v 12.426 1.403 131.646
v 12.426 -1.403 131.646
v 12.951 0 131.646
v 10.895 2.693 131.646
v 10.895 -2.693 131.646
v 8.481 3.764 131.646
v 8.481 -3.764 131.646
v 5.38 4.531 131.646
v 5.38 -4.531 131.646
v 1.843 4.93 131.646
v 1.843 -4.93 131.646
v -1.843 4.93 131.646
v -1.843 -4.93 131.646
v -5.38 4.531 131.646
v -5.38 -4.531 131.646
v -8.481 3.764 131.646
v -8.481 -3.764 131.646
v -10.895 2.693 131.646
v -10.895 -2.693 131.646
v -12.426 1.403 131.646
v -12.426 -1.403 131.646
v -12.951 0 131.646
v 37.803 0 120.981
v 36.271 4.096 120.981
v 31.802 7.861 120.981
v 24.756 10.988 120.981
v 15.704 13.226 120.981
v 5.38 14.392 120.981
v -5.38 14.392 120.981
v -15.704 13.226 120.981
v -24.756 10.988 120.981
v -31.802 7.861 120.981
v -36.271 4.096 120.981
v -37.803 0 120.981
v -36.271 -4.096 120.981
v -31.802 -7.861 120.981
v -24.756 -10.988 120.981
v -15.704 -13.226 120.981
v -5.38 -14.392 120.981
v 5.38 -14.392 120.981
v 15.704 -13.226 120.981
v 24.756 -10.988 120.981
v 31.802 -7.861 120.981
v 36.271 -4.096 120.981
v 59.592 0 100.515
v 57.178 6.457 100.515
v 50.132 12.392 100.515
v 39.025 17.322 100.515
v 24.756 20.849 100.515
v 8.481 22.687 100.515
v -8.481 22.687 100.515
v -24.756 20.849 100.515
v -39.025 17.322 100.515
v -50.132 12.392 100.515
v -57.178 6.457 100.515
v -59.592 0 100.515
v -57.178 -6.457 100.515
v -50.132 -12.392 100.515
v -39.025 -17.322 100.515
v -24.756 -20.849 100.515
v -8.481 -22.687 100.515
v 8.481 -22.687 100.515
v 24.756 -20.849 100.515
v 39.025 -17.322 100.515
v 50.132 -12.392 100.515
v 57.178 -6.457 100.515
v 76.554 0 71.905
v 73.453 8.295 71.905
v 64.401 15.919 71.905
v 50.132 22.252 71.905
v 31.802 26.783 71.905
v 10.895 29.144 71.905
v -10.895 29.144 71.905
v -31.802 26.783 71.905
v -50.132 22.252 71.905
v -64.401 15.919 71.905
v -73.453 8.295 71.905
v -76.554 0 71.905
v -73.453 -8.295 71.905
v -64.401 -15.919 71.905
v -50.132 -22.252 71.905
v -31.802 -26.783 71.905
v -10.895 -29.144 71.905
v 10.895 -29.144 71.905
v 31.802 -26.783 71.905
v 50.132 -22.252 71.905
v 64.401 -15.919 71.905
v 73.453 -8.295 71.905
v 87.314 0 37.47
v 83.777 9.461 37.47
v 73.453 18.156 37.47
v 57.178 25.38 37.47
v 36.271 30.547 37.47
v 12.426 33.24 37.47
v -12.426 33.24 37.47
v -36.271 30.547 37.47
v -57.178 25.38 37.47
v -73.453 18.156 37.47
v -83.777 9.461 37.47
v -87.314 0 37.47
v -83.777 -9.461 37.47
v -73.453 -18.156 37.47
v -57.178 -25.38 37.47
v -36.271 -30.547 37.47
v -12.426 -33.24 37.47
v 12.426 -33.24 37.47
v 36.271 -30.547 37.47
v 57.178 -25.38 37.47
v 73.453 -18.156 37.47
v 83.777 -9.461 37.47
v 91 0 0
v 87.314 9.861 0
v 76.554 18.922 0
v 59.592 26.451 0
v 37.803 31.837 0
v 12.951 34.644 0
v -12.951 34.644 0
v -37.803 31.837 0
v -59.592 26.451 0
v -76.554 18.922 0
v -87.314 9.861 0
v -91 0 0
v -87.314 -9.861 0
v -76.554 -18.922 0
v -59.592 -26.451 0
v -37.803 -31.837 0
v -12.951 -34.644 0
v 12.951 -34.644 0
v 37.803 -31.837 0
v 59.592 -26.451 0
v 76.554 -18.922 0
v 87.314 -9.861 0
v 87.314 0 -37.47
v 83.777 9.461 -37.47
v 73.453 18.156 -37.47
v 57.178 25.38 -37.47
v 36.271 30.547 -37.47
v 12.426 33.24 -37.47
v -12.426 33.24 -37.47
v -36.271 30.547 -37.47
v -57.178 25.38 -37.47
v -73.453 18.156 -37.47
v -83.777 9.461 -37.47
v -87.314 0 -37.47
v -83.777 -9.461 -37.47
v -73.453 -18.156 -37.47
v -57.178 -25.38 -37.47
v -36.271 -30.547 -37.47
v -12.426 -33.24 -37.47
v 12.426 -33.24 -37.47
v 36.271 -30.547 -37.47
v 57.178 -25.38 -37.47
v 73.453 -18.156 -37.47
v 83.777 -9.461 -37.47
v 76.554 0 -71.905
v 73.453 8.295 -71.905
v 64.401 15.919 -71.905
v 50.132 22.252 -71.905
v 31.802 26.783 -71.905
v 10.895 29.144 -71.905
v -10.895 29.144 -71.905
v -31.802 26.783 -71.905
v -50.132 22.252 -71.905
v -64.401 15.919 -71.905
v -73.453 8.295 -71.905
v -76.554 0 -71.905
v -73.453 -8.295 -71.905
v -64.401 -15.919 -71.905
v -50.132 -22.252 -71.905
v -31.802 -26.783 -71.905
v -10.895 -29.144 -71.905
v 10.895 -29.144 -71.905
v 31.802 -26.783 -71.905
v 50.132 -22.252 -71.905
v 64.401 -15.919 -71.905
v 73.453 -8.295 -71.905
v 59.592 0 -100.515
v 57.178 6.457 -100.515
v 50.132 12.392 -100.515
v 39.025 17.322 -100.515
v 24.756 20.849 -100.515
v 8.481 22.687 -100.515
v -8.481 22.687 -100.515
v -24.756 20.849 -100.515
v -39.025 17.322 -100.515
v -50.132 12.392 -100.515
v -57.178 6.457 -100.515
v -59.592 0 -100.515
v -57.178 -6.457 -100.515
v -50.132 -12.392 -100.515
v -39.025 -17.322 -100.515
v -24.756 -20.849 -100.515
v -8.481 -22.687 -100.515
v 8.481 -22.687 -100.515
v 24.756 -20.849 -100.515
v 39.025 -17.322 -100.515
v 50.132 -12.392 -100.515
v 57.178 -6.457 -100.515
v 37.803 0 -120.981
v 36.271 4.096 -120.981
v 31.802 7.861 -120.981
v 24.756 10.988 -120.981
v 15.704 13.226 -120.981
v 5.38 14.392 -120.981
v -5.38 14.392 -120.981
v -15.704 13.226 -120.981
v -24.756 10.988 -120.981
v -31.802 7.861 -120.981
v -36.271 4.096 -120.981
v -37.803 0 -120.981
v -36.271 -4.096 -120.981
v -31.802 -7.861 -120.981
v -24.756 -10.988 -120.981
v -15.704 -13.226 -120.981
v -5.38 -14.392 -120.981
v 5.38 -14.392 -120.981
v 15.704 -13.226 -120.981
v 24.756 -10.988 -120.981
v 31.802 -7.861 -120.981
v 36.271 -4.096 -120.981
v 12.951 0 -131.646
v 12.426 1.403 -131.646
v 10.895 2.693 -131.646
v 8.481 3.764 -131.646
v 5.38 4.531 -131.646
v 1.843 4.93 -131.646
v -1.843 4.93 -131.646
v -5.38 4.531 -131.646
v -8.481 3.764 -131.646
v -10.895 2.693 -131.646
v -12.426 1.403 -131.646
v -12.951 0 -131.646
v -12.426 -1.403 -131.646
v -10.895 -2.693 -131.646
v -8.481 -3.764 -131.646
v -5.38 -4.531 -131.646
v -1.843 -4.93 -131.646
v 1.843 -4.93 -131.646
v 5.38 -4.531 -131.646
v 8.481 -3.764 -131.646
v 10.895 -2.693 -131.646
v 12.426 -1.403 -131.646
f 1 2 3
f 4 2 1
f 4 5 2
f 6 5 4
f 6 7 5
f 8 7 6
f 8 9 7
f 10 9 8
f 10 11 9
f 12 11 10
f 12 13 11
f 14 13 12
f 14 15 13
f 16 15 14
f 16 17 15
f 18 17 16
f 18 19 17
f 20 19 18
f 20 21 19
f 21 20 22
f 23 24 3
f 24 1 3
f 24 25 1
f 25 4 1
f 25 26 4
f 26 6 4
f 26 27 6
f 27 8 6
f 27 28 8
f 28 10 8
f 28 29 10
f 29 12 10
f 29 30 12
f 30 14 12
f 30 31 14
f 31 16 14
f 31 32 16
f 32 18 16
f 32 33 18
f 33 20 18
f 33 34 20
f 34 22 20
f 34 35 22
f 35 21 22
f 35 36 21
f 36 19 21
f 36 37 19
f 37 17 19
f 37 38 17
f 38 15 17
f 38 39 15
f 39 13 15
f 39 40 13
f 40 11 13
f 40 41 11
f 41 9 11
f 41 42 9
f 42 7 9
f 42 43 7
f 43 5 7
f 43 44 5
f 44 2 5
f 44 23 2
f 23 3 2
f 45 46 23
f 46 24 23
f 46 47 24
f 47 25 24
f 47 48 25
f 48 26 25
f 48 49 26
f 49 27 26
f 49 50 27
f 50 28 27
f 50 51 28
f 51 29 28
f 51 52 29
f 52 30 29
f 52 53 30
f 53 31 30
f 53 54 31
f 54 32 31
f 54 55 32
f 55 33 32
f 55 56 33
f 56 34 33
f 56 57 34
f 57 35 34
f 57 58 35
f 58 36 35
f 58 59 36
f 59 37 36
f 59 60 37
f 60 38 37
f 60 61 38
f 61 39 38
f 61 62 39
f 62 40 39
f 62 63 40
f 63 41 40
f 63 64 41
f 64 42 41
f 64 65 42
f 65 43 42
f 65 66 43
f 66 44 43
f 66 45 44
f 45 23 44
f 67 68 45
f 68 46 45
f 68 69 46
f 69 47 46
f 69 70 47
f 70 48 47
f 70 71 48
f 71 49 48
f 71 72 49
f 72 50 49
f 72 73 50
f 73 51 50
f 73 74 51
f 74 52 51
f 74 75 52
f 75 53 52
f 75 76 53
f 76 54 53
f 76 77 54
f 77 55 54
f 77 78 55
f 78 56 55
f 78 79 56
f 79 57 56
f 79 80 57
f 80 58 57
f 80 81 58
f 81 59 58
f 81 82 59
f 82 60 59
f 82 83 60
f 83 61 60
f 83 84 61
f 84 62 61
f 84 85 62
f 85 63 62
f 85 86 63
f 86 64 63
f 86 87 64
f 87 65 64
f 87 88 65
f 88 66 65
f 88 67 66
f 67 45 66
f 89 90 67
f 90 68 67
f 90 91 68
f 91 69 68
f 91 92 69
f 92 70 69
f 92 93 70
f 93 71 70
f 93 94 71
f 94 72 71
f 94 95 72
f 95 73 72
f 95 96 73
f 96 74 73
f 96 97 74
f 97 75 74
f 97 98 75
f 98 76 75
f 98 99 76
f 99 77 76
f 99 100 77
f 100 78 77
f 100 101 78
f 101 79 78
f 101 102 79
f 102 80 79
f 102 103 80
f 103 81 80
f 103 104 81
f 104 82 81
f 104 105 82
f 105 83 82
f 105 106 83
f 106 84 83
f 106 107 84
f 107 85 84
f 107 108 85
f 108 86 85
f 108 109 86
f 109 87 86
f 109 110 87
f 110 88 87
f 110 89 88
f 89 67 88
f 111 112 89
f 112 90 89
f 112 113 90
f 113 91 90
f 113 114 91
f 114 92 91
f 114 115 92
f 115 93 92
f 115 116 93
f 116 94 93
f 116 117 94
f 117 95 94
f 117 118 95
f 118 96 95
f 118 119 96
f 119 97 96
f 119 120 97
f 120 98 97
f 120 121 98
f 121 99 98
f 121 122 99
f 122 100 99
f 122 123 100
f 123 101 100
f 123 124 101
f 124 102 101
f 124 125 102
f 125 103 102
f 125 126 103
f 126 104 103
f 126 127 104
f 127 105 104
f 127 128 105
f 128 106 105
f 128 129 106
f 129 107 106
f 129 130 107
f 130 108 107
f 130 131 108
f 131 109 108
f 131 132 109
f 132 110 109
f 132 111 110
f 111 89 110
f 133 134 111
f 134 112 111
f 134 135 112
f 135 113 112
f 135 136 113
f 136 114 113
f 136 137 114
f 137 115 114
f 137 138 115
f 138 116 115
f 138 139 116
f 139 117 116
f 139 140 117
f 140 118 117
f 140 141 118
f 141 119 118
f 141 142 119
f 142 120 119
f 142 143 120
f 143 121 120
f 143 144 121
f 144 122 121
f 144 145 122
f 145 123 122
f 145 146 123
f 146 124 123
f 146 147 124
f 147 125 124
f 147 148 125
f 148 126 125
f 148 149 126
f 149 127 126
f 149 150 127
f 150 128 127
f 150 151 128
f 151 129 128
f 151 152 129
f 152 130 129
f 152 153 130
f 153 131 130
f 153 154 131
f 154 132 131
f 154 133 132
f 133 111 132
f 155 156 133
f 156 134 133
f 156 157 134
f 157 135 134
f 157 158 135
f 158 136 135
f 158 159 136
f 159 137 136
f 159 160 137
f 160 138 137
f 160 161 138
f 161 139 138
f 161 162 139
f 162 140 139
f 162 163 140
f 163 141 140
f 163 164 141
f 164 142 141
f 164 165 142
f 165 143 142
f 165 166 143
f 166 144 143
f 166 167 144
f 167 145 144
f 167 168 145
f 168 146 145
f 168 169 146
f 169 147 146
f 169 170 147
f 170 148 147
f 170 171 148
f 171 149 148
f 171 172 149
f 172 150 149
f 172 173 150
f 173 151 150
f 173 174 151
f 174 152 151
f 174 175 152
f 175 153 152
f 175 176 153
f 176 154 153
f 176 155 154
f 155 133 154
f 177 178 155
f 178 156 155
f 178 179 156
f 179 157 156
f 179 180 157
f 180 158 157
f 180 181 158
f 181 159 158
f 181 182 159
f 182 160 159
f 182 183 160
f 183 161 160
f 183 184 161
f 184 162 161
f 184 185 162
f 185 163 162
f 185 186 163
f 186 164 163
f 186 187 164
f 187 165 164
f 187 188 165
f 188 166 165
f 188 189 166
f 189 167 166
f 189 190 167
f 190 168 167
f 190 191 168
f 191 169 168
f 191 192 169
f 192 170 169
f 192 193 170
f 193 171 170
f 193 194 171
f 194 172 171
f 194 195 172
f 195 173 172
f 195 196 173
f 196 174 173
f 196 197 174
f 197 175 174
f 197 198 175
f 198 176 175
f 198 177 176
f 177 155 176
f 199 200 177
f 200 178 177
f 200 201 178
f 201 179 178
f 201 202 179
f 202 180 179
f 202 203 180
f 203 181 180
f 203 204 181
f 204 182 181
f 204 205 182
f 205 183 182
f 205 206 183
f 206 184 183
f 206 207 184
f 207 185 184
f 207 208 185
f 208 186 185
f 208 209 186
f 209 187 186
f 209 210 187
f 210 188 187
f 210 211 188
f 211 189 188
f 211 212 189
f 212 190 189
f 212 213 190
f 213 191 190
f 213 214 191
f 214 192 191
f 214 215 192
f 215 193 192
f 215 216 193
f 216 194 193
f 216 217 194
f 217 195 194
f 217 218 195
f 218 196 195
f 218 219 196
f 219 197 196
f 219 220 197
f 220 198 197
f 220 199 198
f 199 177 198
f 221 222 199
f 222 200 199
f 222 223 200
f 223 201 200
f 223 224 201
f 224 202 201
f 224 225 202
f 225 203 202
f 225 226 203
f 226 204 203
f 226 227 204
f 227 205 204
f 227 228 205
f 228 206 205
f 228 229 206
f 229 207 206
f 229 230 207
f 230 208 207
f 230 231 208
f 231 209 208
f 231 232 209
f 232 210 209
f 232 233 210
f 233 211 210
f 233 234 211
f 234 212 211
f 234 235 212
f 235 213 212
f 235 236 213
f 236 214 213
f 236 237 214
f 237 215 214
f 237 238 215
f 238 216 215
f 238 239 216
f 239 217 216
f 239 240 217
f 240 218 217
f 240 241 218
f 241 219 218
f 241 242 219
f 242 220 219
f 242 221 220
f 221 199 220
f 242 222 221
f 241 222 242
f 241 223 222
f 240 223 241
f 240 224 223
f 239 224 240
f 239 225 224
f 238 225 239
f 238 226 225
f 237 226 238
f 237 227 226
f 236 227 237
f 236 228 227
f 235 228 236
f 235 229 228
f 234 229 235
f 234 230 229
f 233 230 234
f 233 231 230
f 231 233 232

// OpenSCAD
// Generated by SolidPython 1.0.1 on 2020-07-29 00:46:50


scale(v = [13, 5, 19]) {
	sphere(r = 7);
}
/***********************************************
*********      SolidPython code:      **********
************************************************
 
# import packages: SolidPython
from solid import *
from solid.utils import *
from itertools import chain, combinations, permutations


class Resize:

    def __init__(self, scad_file):
        self.scad_file = scad_file
        #self.scad_file = import_scad(scad_file)
        # cone/cylinder param:
        self.r1 = 0
        self.r2 = 0
        self.h = 0
        # rectangular prism param:
        self.w = 0
        self.l = 0
        # ellipse param:
        self.r = 0

    # import OpenScad code (file name corresponds to shape)


    # classify shape + parameters
    def assign(self, param1, param2, param3):
        if self.scad_file == 'cone.scad':
            self.r1 = param1
            self.r2 = param2
            self.h = param3
        elif self.scad_file == 'cylinder.scad':
            self.r1 = param1
            self.r2 = param2
            self.h = param3
        elif self.scad_file == 'rectangularPrism.scad':
            self.h = param1
            self.l = param2
            self.w = param3
        else:
            self.r = param1
            self.h = param2

    # resize parameters
    def iterate(self):
        x = range(3, 20, 2)
        i = 1
        if self.scad_file == 'cone.scad':
            tempList = list(permutations(x, 2))
            for temp in tempList:
                param1 = temp[0]
                param2 = temp[1]
                filepath = 'produced_scad_files/' + 'cone' + str(param1) + '_' + str(param2) + '_' + '.scad'
                scad_render_to_file(cylinder(h=param1, r1=param2, r2=0), filepath)

        elif self.scad_file == 'cylinder.scad':
            tempList = list(permutations(x, 3))
            for temp in tempList:
                param1 = temp[0]
                param2 = temp[1]
                filepath = 'produced_scad_files/' + 'cylinder' + str(param1) + '_' + str(param2) + '_' + '.scad'
                scad_render_to_file(cylinder(h=param1, r1=param2, r2=param2), filepath)

        elif self.scad_file == 'rectangularPrism.scad':
            tempList = list(permutations(x, 3))
            for temp in tempList:
                param1 = temp[0]
                param2 = temp[1]
                param3 = temp[2]
                filepath = 'produced_scad_files/' + 'rectangularPrism' + str(param1) + '_' + str(param2) + '_' + str(
                    param3) + '.scad'
                scad_render_to_file(cube(size=(param1, param2, param3)), filepath)

        elif self.scad_file == 'ellipse.scad':
            tempList = list(permutations(x, 4))
            for temp in tempList:
                param1 = temp[0]
                param2 = temp[1]
                param3 = temp[2]
                param4 = temp[3]
                filepath = 'produced_scad_files/' + 'ellipse' + str(param1) + '_' + str(param2) + '_' + str(param3) + '_' + str(param4) + '.scad'
                scad_render_to_file(scale([param1, param2, param3])(sphere(r=param4)), filepath)

    def render_to_scadfile(self):
        scad_render_to_file(scad, 'example.scad') 
 
************************************************/
